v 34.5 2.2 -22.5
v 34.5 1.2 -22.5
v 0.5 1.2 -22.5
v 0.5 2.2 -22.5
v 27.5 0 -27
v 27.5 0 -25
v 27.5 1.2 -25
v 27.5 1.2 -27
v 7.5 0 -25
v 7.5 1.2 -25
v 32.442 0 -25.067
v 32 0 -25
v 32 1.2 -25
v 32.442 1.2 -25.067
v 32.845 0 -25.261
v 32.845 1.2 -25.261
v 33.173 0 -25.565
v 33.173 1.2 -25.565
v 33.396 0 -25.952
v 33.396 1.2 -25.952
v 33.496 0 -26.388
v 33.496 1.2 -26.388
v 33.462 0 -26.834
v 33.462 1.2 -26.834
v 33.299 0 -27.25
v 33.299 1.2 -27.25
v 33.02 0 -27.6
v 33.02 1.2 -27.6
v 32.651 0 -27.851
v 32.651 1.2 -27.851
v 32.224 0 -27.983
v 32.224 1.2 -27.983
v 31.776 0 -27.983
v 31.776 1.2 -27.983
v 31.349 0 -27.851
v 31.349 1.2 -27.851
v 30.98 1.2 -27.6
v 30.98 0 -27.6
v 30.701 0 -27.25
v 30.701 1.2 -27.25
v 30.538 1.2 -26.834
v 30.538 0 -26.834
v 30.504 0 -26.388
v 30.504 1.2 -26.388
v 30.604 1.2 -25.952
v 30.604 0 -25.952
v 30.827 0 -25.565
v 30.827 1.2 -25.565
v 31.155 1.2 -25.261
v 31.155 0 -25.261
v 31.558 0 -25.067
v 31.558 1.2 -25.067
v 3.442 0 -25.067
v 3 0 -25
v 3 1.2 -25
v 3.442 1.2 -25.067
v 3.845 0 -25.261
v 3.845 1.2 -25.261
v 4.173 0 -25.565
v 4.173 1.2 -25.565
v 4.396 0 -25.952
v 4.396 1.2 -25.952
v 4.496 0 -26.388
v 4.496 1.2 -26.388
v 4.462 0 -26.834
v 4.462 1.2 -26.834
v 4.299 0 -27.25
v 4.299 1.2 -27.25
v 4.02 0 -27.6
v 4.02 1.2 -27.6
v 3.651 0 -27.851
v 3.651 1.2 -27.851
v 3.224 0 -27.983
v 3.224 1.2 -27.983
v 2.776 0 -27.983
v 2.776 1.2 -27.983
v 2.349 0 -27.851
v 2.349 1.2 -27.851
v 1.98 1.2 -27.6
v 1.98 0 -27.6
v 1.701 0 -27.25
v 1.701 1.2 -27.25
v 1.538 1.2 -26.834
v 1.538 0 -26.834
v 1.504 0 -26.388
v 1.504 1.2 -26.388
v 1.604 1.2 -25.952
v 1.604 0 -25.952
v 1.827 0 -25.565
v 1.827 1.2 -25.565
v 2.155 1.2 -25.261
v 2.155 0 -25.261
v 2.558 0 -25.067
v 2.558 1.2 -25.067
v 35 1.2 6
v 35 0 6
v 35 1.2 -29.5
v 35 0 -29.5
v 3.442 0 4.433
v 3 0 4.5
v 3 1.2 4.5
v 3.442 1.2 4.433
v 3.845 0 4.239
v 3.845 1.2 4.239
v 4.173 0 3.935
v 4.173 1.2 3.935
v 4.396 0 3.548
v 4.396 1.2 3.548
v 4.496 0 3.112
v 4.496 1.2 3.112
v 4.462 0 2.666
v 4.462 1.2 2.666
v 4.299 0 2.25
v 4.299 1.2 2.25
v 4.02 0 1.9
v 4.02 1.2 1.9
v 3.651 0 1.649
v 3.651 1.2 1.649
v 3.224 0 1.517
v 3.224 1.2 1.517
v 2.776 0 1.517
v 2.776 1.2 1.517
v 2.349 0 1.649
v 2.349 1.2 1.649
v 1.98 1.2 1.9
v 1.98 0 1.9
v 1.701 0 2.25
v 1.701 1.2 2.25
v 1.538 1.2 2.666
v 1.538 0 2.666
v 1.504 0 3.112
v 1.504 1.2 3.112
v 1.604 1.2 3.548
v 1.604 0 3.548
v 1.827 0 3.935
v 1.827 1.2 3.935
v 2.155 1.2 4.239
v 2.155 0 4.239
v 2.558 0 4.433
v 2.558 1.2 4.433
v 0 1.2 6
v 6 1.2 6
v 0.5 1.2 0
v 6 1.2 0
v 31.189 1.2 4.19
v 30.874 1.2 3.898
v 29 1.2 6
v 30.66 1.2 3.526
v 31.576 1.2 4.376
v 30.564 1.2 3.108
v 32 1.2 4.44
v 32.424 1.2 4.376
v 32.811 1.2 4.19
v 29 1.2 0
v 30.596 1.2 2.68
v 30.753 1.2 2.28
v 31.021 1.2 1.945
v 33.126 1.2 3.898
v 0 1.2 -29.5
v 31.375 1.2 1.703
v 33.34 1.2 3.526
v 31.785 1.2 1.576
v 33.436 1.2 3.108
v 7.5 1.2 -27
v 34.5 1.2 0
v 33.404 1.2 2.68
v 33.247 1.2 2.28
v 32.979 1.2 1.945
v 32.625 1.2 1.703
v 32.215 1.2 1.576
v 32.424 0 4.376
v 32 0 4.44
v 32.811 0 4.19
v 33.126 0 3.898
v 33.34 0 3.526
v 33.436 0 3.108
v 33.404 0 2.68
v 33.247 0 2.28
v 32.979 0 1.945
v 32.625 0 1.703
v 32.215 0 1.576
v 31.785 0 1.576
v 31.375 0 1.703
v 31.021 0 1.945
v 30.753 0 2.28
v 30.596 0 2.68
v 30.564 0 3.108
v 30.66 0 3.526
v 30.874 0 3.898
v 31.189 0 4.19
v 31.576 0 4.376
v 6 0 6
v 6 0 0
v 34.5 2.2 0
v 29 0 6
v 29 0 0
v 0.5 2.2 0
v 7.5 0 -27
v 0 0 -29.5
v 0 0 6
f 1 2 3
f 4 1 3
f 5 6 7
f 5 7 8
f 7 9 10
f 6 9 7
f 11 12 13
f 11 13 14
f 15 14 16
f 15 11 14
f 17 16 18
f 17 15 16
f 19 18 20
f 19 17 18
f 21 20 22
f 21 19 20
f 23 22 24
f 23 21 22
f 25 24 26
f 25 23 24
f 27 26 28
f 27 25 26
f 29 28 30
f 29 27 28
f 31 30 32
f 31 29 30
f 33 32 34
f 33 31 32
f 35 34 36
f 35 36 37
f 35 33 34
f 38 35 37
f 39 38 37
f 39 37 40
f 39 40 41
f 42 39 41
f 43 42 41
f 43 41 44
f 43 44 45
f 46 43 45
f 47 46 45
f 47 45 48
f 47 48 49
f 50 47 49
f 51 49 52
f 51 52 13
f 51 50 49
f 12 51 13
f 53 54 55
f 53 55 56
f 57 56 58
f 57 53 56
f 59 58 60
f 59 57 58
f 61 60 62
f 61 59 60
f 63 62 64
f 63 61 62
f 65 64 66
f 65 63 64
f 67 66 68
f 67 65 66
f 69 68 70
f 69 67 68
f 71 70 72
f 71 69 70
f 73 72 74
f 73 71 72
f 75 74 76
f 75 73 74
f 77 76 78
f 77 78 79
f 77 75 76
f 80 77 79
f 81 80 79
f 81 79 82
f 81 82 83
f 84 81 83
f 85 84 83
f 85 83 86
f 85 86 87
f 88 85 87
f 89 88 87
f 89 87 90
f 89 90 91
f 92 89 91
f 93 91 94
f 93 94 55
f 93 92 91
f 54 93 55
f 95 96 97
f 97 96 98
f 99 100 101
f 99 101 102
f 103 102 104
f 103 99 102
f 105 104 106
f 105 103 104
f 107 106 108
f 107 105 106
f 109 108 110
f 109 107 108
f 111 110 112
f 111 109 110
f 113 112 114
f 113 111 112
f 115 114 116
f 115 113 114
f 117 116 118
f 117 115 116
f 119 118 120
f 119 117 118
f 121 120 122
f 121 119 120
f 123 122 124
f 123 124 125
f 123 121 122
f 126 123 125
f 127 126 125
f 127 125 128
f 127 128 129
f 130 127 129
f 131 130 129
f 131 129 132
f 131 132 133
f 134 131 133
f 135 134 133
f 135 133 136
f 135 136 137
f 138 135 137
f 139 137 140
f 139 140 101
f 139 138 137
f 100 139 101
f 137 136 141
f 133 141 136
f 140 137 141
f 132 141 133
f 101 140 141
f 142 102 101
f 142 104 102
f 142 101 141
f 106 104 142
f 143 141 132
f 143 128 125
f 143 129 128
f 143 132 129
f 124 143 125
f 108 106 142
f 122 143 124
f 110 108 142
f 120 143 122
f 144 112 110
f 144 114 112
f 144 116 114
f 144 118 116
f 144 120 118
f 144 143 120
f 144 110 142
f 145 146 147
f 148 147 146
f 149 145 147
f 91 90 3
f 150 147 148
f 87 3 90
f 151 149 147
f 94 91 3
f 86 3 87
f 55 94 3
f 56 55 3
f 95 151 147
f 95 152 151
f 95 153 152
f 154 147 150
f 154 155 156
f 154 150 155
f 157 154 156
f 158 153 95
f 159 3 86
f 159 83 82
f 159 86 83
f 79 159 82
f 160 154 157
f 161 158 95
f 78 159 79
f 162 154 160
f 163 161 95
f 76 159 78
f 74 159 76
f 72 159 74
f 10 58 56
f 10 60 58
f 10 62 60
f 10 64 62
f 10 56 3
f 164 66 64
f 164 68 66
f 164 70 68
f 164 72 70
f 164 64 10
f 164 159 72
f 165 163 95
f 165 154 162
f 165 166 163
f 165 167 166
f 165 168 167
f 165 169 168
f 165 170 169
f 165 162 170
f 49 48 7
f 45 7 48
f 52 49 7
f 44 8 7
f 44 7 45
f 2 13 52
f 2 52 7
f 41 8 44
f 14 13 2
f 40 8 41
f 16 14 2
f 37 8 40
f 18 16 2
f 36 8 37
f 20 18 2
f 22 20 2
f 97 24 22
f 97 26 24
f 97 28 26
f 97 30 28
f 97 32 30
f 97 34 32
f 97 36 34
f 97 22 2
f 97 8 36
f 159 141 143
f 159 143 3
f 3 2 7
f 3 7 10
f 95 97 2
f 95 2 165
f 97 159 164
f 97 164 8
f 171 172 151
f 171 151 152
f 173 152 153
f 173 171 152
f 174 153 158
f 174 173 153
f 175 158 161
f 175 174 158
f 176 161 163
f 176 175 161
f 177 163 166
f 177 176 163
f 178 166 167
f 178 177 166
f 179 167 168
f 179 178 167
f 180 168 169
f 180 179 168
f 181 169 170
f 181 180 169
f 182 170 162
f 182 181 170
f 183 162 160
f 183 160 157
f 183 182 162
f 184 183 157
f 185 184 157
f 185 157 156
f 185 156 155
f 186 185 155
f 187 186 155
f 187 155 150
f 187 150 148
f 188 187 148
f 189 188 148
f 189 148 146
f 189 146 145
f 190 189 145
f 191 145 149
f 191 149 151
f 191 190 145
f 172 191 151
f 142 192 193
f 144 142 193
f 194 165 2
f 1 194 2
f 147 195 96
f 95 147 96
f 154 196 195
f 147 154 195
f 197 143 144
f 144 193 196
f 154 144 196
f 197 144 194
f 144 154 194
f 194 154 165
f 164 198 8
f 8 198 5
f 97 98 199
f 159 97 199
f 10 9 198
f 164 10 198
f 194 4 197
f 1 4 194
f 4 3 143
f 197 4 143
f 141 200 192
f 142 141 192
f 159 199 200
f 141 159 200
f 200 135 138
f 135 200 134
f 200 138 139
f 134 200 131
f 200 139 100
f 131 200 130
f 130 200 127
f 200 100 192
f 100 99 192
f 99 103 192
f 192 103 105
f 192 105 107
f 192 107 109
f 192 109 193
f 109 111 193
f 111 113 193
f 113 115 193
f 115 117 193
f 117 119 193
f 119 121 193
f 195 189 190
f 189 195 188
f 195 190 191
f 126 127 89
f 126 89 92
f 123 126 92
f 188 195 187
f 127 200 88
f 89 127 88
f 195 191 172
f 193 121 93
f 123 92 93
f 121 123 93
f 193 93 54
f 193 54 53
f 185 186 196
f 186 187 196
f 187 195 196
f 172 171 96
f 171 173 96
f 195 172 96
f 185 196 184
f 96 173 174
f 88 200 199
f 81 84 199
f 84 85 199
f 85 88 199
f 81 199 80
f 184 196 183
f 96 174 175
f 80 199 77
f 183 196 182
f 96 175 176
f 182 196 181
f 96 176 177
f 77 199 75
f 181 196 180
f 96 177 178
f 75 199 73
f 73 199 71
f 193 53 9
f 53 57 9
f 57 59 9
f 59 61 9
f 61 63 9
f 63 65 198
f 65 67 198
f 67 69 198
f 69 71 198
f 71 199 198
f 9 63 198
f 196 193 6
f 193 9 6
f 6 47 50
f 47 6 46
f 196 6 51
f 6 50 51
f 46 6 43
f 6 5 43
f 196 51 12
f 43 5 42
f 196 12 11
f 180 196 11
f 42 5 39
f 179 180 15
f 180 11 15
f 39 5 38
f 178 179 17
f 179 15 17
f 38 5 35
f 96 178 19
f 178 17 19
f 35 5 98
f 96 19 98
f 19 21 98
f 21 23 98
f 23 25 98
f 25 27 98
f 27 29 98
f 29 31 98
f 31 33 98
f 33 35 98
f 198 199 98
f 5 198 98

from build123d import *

# Parameters (mm, degrees)
SKETCH1_R           = 1.5
SKETCH1_W           = 20
SKETCH1_H           = 2
SKETCH1_R_2         = 1.439670622
BOSS_EXTRUDE3_DEPTH = 1.2
BOSS_EXTRUDE4_DEPTH = 2.2


with BuildPart() as part:
    # Sketch1 → Boss-Extrude3 (new body)
    with BuildSketch(Plane(origin=(0, 0, 0), x_dir=(1, 0, 0), z_dir=(0, 1, 0))):
        Polygon((0, 29.5), (0, -6), (6, -6), (6, 0), (0.5, 0), (0.5, 22.5), (34.5, 22.5), (34.5, 0), (29, 0), (29, -6), (35, -6), (35, 29.5), align=None)
        with Locations((3, 26.5)):
            Circle(SKETCH1_R, mode=Mode.SUBTRACT)
        with Locations((17.5, 26)):
            Rectangle(SKETCH1_W, SKETCH1_H, mode=Mode.SUBTRACT)
        with Locations((32, 26.5)):
            Circle(SKETCH1_R, mode=Mode.SUBTRACT)
        with Locations((32, -3)):
            Circle(SKETCH1_R_2, mode=Mode.SUBTRACT)
        with Locations((3, -3)):
            Circle(SKETCH1_R, mode=Mode.SUBTRACT)
    extrude(amount=BOSS_EXTRUDE3_DEPTH)

    # Sketch1<7> → Boss-Extrude4 (add)
    with BuildSketch(Plane(origin=(0, 0, 0), x_dir=(1, 0, 0), z_dir=(0, 1, 0))):
        Polygon((0.5, 22.5), (0.5, 0), (6, 0), (29, 0), (34.5, 0), (34.5, 22.5), align=None)
    extrude(amount=BOSS_EXTRUDE4_DEPTH)


solid = part.part
